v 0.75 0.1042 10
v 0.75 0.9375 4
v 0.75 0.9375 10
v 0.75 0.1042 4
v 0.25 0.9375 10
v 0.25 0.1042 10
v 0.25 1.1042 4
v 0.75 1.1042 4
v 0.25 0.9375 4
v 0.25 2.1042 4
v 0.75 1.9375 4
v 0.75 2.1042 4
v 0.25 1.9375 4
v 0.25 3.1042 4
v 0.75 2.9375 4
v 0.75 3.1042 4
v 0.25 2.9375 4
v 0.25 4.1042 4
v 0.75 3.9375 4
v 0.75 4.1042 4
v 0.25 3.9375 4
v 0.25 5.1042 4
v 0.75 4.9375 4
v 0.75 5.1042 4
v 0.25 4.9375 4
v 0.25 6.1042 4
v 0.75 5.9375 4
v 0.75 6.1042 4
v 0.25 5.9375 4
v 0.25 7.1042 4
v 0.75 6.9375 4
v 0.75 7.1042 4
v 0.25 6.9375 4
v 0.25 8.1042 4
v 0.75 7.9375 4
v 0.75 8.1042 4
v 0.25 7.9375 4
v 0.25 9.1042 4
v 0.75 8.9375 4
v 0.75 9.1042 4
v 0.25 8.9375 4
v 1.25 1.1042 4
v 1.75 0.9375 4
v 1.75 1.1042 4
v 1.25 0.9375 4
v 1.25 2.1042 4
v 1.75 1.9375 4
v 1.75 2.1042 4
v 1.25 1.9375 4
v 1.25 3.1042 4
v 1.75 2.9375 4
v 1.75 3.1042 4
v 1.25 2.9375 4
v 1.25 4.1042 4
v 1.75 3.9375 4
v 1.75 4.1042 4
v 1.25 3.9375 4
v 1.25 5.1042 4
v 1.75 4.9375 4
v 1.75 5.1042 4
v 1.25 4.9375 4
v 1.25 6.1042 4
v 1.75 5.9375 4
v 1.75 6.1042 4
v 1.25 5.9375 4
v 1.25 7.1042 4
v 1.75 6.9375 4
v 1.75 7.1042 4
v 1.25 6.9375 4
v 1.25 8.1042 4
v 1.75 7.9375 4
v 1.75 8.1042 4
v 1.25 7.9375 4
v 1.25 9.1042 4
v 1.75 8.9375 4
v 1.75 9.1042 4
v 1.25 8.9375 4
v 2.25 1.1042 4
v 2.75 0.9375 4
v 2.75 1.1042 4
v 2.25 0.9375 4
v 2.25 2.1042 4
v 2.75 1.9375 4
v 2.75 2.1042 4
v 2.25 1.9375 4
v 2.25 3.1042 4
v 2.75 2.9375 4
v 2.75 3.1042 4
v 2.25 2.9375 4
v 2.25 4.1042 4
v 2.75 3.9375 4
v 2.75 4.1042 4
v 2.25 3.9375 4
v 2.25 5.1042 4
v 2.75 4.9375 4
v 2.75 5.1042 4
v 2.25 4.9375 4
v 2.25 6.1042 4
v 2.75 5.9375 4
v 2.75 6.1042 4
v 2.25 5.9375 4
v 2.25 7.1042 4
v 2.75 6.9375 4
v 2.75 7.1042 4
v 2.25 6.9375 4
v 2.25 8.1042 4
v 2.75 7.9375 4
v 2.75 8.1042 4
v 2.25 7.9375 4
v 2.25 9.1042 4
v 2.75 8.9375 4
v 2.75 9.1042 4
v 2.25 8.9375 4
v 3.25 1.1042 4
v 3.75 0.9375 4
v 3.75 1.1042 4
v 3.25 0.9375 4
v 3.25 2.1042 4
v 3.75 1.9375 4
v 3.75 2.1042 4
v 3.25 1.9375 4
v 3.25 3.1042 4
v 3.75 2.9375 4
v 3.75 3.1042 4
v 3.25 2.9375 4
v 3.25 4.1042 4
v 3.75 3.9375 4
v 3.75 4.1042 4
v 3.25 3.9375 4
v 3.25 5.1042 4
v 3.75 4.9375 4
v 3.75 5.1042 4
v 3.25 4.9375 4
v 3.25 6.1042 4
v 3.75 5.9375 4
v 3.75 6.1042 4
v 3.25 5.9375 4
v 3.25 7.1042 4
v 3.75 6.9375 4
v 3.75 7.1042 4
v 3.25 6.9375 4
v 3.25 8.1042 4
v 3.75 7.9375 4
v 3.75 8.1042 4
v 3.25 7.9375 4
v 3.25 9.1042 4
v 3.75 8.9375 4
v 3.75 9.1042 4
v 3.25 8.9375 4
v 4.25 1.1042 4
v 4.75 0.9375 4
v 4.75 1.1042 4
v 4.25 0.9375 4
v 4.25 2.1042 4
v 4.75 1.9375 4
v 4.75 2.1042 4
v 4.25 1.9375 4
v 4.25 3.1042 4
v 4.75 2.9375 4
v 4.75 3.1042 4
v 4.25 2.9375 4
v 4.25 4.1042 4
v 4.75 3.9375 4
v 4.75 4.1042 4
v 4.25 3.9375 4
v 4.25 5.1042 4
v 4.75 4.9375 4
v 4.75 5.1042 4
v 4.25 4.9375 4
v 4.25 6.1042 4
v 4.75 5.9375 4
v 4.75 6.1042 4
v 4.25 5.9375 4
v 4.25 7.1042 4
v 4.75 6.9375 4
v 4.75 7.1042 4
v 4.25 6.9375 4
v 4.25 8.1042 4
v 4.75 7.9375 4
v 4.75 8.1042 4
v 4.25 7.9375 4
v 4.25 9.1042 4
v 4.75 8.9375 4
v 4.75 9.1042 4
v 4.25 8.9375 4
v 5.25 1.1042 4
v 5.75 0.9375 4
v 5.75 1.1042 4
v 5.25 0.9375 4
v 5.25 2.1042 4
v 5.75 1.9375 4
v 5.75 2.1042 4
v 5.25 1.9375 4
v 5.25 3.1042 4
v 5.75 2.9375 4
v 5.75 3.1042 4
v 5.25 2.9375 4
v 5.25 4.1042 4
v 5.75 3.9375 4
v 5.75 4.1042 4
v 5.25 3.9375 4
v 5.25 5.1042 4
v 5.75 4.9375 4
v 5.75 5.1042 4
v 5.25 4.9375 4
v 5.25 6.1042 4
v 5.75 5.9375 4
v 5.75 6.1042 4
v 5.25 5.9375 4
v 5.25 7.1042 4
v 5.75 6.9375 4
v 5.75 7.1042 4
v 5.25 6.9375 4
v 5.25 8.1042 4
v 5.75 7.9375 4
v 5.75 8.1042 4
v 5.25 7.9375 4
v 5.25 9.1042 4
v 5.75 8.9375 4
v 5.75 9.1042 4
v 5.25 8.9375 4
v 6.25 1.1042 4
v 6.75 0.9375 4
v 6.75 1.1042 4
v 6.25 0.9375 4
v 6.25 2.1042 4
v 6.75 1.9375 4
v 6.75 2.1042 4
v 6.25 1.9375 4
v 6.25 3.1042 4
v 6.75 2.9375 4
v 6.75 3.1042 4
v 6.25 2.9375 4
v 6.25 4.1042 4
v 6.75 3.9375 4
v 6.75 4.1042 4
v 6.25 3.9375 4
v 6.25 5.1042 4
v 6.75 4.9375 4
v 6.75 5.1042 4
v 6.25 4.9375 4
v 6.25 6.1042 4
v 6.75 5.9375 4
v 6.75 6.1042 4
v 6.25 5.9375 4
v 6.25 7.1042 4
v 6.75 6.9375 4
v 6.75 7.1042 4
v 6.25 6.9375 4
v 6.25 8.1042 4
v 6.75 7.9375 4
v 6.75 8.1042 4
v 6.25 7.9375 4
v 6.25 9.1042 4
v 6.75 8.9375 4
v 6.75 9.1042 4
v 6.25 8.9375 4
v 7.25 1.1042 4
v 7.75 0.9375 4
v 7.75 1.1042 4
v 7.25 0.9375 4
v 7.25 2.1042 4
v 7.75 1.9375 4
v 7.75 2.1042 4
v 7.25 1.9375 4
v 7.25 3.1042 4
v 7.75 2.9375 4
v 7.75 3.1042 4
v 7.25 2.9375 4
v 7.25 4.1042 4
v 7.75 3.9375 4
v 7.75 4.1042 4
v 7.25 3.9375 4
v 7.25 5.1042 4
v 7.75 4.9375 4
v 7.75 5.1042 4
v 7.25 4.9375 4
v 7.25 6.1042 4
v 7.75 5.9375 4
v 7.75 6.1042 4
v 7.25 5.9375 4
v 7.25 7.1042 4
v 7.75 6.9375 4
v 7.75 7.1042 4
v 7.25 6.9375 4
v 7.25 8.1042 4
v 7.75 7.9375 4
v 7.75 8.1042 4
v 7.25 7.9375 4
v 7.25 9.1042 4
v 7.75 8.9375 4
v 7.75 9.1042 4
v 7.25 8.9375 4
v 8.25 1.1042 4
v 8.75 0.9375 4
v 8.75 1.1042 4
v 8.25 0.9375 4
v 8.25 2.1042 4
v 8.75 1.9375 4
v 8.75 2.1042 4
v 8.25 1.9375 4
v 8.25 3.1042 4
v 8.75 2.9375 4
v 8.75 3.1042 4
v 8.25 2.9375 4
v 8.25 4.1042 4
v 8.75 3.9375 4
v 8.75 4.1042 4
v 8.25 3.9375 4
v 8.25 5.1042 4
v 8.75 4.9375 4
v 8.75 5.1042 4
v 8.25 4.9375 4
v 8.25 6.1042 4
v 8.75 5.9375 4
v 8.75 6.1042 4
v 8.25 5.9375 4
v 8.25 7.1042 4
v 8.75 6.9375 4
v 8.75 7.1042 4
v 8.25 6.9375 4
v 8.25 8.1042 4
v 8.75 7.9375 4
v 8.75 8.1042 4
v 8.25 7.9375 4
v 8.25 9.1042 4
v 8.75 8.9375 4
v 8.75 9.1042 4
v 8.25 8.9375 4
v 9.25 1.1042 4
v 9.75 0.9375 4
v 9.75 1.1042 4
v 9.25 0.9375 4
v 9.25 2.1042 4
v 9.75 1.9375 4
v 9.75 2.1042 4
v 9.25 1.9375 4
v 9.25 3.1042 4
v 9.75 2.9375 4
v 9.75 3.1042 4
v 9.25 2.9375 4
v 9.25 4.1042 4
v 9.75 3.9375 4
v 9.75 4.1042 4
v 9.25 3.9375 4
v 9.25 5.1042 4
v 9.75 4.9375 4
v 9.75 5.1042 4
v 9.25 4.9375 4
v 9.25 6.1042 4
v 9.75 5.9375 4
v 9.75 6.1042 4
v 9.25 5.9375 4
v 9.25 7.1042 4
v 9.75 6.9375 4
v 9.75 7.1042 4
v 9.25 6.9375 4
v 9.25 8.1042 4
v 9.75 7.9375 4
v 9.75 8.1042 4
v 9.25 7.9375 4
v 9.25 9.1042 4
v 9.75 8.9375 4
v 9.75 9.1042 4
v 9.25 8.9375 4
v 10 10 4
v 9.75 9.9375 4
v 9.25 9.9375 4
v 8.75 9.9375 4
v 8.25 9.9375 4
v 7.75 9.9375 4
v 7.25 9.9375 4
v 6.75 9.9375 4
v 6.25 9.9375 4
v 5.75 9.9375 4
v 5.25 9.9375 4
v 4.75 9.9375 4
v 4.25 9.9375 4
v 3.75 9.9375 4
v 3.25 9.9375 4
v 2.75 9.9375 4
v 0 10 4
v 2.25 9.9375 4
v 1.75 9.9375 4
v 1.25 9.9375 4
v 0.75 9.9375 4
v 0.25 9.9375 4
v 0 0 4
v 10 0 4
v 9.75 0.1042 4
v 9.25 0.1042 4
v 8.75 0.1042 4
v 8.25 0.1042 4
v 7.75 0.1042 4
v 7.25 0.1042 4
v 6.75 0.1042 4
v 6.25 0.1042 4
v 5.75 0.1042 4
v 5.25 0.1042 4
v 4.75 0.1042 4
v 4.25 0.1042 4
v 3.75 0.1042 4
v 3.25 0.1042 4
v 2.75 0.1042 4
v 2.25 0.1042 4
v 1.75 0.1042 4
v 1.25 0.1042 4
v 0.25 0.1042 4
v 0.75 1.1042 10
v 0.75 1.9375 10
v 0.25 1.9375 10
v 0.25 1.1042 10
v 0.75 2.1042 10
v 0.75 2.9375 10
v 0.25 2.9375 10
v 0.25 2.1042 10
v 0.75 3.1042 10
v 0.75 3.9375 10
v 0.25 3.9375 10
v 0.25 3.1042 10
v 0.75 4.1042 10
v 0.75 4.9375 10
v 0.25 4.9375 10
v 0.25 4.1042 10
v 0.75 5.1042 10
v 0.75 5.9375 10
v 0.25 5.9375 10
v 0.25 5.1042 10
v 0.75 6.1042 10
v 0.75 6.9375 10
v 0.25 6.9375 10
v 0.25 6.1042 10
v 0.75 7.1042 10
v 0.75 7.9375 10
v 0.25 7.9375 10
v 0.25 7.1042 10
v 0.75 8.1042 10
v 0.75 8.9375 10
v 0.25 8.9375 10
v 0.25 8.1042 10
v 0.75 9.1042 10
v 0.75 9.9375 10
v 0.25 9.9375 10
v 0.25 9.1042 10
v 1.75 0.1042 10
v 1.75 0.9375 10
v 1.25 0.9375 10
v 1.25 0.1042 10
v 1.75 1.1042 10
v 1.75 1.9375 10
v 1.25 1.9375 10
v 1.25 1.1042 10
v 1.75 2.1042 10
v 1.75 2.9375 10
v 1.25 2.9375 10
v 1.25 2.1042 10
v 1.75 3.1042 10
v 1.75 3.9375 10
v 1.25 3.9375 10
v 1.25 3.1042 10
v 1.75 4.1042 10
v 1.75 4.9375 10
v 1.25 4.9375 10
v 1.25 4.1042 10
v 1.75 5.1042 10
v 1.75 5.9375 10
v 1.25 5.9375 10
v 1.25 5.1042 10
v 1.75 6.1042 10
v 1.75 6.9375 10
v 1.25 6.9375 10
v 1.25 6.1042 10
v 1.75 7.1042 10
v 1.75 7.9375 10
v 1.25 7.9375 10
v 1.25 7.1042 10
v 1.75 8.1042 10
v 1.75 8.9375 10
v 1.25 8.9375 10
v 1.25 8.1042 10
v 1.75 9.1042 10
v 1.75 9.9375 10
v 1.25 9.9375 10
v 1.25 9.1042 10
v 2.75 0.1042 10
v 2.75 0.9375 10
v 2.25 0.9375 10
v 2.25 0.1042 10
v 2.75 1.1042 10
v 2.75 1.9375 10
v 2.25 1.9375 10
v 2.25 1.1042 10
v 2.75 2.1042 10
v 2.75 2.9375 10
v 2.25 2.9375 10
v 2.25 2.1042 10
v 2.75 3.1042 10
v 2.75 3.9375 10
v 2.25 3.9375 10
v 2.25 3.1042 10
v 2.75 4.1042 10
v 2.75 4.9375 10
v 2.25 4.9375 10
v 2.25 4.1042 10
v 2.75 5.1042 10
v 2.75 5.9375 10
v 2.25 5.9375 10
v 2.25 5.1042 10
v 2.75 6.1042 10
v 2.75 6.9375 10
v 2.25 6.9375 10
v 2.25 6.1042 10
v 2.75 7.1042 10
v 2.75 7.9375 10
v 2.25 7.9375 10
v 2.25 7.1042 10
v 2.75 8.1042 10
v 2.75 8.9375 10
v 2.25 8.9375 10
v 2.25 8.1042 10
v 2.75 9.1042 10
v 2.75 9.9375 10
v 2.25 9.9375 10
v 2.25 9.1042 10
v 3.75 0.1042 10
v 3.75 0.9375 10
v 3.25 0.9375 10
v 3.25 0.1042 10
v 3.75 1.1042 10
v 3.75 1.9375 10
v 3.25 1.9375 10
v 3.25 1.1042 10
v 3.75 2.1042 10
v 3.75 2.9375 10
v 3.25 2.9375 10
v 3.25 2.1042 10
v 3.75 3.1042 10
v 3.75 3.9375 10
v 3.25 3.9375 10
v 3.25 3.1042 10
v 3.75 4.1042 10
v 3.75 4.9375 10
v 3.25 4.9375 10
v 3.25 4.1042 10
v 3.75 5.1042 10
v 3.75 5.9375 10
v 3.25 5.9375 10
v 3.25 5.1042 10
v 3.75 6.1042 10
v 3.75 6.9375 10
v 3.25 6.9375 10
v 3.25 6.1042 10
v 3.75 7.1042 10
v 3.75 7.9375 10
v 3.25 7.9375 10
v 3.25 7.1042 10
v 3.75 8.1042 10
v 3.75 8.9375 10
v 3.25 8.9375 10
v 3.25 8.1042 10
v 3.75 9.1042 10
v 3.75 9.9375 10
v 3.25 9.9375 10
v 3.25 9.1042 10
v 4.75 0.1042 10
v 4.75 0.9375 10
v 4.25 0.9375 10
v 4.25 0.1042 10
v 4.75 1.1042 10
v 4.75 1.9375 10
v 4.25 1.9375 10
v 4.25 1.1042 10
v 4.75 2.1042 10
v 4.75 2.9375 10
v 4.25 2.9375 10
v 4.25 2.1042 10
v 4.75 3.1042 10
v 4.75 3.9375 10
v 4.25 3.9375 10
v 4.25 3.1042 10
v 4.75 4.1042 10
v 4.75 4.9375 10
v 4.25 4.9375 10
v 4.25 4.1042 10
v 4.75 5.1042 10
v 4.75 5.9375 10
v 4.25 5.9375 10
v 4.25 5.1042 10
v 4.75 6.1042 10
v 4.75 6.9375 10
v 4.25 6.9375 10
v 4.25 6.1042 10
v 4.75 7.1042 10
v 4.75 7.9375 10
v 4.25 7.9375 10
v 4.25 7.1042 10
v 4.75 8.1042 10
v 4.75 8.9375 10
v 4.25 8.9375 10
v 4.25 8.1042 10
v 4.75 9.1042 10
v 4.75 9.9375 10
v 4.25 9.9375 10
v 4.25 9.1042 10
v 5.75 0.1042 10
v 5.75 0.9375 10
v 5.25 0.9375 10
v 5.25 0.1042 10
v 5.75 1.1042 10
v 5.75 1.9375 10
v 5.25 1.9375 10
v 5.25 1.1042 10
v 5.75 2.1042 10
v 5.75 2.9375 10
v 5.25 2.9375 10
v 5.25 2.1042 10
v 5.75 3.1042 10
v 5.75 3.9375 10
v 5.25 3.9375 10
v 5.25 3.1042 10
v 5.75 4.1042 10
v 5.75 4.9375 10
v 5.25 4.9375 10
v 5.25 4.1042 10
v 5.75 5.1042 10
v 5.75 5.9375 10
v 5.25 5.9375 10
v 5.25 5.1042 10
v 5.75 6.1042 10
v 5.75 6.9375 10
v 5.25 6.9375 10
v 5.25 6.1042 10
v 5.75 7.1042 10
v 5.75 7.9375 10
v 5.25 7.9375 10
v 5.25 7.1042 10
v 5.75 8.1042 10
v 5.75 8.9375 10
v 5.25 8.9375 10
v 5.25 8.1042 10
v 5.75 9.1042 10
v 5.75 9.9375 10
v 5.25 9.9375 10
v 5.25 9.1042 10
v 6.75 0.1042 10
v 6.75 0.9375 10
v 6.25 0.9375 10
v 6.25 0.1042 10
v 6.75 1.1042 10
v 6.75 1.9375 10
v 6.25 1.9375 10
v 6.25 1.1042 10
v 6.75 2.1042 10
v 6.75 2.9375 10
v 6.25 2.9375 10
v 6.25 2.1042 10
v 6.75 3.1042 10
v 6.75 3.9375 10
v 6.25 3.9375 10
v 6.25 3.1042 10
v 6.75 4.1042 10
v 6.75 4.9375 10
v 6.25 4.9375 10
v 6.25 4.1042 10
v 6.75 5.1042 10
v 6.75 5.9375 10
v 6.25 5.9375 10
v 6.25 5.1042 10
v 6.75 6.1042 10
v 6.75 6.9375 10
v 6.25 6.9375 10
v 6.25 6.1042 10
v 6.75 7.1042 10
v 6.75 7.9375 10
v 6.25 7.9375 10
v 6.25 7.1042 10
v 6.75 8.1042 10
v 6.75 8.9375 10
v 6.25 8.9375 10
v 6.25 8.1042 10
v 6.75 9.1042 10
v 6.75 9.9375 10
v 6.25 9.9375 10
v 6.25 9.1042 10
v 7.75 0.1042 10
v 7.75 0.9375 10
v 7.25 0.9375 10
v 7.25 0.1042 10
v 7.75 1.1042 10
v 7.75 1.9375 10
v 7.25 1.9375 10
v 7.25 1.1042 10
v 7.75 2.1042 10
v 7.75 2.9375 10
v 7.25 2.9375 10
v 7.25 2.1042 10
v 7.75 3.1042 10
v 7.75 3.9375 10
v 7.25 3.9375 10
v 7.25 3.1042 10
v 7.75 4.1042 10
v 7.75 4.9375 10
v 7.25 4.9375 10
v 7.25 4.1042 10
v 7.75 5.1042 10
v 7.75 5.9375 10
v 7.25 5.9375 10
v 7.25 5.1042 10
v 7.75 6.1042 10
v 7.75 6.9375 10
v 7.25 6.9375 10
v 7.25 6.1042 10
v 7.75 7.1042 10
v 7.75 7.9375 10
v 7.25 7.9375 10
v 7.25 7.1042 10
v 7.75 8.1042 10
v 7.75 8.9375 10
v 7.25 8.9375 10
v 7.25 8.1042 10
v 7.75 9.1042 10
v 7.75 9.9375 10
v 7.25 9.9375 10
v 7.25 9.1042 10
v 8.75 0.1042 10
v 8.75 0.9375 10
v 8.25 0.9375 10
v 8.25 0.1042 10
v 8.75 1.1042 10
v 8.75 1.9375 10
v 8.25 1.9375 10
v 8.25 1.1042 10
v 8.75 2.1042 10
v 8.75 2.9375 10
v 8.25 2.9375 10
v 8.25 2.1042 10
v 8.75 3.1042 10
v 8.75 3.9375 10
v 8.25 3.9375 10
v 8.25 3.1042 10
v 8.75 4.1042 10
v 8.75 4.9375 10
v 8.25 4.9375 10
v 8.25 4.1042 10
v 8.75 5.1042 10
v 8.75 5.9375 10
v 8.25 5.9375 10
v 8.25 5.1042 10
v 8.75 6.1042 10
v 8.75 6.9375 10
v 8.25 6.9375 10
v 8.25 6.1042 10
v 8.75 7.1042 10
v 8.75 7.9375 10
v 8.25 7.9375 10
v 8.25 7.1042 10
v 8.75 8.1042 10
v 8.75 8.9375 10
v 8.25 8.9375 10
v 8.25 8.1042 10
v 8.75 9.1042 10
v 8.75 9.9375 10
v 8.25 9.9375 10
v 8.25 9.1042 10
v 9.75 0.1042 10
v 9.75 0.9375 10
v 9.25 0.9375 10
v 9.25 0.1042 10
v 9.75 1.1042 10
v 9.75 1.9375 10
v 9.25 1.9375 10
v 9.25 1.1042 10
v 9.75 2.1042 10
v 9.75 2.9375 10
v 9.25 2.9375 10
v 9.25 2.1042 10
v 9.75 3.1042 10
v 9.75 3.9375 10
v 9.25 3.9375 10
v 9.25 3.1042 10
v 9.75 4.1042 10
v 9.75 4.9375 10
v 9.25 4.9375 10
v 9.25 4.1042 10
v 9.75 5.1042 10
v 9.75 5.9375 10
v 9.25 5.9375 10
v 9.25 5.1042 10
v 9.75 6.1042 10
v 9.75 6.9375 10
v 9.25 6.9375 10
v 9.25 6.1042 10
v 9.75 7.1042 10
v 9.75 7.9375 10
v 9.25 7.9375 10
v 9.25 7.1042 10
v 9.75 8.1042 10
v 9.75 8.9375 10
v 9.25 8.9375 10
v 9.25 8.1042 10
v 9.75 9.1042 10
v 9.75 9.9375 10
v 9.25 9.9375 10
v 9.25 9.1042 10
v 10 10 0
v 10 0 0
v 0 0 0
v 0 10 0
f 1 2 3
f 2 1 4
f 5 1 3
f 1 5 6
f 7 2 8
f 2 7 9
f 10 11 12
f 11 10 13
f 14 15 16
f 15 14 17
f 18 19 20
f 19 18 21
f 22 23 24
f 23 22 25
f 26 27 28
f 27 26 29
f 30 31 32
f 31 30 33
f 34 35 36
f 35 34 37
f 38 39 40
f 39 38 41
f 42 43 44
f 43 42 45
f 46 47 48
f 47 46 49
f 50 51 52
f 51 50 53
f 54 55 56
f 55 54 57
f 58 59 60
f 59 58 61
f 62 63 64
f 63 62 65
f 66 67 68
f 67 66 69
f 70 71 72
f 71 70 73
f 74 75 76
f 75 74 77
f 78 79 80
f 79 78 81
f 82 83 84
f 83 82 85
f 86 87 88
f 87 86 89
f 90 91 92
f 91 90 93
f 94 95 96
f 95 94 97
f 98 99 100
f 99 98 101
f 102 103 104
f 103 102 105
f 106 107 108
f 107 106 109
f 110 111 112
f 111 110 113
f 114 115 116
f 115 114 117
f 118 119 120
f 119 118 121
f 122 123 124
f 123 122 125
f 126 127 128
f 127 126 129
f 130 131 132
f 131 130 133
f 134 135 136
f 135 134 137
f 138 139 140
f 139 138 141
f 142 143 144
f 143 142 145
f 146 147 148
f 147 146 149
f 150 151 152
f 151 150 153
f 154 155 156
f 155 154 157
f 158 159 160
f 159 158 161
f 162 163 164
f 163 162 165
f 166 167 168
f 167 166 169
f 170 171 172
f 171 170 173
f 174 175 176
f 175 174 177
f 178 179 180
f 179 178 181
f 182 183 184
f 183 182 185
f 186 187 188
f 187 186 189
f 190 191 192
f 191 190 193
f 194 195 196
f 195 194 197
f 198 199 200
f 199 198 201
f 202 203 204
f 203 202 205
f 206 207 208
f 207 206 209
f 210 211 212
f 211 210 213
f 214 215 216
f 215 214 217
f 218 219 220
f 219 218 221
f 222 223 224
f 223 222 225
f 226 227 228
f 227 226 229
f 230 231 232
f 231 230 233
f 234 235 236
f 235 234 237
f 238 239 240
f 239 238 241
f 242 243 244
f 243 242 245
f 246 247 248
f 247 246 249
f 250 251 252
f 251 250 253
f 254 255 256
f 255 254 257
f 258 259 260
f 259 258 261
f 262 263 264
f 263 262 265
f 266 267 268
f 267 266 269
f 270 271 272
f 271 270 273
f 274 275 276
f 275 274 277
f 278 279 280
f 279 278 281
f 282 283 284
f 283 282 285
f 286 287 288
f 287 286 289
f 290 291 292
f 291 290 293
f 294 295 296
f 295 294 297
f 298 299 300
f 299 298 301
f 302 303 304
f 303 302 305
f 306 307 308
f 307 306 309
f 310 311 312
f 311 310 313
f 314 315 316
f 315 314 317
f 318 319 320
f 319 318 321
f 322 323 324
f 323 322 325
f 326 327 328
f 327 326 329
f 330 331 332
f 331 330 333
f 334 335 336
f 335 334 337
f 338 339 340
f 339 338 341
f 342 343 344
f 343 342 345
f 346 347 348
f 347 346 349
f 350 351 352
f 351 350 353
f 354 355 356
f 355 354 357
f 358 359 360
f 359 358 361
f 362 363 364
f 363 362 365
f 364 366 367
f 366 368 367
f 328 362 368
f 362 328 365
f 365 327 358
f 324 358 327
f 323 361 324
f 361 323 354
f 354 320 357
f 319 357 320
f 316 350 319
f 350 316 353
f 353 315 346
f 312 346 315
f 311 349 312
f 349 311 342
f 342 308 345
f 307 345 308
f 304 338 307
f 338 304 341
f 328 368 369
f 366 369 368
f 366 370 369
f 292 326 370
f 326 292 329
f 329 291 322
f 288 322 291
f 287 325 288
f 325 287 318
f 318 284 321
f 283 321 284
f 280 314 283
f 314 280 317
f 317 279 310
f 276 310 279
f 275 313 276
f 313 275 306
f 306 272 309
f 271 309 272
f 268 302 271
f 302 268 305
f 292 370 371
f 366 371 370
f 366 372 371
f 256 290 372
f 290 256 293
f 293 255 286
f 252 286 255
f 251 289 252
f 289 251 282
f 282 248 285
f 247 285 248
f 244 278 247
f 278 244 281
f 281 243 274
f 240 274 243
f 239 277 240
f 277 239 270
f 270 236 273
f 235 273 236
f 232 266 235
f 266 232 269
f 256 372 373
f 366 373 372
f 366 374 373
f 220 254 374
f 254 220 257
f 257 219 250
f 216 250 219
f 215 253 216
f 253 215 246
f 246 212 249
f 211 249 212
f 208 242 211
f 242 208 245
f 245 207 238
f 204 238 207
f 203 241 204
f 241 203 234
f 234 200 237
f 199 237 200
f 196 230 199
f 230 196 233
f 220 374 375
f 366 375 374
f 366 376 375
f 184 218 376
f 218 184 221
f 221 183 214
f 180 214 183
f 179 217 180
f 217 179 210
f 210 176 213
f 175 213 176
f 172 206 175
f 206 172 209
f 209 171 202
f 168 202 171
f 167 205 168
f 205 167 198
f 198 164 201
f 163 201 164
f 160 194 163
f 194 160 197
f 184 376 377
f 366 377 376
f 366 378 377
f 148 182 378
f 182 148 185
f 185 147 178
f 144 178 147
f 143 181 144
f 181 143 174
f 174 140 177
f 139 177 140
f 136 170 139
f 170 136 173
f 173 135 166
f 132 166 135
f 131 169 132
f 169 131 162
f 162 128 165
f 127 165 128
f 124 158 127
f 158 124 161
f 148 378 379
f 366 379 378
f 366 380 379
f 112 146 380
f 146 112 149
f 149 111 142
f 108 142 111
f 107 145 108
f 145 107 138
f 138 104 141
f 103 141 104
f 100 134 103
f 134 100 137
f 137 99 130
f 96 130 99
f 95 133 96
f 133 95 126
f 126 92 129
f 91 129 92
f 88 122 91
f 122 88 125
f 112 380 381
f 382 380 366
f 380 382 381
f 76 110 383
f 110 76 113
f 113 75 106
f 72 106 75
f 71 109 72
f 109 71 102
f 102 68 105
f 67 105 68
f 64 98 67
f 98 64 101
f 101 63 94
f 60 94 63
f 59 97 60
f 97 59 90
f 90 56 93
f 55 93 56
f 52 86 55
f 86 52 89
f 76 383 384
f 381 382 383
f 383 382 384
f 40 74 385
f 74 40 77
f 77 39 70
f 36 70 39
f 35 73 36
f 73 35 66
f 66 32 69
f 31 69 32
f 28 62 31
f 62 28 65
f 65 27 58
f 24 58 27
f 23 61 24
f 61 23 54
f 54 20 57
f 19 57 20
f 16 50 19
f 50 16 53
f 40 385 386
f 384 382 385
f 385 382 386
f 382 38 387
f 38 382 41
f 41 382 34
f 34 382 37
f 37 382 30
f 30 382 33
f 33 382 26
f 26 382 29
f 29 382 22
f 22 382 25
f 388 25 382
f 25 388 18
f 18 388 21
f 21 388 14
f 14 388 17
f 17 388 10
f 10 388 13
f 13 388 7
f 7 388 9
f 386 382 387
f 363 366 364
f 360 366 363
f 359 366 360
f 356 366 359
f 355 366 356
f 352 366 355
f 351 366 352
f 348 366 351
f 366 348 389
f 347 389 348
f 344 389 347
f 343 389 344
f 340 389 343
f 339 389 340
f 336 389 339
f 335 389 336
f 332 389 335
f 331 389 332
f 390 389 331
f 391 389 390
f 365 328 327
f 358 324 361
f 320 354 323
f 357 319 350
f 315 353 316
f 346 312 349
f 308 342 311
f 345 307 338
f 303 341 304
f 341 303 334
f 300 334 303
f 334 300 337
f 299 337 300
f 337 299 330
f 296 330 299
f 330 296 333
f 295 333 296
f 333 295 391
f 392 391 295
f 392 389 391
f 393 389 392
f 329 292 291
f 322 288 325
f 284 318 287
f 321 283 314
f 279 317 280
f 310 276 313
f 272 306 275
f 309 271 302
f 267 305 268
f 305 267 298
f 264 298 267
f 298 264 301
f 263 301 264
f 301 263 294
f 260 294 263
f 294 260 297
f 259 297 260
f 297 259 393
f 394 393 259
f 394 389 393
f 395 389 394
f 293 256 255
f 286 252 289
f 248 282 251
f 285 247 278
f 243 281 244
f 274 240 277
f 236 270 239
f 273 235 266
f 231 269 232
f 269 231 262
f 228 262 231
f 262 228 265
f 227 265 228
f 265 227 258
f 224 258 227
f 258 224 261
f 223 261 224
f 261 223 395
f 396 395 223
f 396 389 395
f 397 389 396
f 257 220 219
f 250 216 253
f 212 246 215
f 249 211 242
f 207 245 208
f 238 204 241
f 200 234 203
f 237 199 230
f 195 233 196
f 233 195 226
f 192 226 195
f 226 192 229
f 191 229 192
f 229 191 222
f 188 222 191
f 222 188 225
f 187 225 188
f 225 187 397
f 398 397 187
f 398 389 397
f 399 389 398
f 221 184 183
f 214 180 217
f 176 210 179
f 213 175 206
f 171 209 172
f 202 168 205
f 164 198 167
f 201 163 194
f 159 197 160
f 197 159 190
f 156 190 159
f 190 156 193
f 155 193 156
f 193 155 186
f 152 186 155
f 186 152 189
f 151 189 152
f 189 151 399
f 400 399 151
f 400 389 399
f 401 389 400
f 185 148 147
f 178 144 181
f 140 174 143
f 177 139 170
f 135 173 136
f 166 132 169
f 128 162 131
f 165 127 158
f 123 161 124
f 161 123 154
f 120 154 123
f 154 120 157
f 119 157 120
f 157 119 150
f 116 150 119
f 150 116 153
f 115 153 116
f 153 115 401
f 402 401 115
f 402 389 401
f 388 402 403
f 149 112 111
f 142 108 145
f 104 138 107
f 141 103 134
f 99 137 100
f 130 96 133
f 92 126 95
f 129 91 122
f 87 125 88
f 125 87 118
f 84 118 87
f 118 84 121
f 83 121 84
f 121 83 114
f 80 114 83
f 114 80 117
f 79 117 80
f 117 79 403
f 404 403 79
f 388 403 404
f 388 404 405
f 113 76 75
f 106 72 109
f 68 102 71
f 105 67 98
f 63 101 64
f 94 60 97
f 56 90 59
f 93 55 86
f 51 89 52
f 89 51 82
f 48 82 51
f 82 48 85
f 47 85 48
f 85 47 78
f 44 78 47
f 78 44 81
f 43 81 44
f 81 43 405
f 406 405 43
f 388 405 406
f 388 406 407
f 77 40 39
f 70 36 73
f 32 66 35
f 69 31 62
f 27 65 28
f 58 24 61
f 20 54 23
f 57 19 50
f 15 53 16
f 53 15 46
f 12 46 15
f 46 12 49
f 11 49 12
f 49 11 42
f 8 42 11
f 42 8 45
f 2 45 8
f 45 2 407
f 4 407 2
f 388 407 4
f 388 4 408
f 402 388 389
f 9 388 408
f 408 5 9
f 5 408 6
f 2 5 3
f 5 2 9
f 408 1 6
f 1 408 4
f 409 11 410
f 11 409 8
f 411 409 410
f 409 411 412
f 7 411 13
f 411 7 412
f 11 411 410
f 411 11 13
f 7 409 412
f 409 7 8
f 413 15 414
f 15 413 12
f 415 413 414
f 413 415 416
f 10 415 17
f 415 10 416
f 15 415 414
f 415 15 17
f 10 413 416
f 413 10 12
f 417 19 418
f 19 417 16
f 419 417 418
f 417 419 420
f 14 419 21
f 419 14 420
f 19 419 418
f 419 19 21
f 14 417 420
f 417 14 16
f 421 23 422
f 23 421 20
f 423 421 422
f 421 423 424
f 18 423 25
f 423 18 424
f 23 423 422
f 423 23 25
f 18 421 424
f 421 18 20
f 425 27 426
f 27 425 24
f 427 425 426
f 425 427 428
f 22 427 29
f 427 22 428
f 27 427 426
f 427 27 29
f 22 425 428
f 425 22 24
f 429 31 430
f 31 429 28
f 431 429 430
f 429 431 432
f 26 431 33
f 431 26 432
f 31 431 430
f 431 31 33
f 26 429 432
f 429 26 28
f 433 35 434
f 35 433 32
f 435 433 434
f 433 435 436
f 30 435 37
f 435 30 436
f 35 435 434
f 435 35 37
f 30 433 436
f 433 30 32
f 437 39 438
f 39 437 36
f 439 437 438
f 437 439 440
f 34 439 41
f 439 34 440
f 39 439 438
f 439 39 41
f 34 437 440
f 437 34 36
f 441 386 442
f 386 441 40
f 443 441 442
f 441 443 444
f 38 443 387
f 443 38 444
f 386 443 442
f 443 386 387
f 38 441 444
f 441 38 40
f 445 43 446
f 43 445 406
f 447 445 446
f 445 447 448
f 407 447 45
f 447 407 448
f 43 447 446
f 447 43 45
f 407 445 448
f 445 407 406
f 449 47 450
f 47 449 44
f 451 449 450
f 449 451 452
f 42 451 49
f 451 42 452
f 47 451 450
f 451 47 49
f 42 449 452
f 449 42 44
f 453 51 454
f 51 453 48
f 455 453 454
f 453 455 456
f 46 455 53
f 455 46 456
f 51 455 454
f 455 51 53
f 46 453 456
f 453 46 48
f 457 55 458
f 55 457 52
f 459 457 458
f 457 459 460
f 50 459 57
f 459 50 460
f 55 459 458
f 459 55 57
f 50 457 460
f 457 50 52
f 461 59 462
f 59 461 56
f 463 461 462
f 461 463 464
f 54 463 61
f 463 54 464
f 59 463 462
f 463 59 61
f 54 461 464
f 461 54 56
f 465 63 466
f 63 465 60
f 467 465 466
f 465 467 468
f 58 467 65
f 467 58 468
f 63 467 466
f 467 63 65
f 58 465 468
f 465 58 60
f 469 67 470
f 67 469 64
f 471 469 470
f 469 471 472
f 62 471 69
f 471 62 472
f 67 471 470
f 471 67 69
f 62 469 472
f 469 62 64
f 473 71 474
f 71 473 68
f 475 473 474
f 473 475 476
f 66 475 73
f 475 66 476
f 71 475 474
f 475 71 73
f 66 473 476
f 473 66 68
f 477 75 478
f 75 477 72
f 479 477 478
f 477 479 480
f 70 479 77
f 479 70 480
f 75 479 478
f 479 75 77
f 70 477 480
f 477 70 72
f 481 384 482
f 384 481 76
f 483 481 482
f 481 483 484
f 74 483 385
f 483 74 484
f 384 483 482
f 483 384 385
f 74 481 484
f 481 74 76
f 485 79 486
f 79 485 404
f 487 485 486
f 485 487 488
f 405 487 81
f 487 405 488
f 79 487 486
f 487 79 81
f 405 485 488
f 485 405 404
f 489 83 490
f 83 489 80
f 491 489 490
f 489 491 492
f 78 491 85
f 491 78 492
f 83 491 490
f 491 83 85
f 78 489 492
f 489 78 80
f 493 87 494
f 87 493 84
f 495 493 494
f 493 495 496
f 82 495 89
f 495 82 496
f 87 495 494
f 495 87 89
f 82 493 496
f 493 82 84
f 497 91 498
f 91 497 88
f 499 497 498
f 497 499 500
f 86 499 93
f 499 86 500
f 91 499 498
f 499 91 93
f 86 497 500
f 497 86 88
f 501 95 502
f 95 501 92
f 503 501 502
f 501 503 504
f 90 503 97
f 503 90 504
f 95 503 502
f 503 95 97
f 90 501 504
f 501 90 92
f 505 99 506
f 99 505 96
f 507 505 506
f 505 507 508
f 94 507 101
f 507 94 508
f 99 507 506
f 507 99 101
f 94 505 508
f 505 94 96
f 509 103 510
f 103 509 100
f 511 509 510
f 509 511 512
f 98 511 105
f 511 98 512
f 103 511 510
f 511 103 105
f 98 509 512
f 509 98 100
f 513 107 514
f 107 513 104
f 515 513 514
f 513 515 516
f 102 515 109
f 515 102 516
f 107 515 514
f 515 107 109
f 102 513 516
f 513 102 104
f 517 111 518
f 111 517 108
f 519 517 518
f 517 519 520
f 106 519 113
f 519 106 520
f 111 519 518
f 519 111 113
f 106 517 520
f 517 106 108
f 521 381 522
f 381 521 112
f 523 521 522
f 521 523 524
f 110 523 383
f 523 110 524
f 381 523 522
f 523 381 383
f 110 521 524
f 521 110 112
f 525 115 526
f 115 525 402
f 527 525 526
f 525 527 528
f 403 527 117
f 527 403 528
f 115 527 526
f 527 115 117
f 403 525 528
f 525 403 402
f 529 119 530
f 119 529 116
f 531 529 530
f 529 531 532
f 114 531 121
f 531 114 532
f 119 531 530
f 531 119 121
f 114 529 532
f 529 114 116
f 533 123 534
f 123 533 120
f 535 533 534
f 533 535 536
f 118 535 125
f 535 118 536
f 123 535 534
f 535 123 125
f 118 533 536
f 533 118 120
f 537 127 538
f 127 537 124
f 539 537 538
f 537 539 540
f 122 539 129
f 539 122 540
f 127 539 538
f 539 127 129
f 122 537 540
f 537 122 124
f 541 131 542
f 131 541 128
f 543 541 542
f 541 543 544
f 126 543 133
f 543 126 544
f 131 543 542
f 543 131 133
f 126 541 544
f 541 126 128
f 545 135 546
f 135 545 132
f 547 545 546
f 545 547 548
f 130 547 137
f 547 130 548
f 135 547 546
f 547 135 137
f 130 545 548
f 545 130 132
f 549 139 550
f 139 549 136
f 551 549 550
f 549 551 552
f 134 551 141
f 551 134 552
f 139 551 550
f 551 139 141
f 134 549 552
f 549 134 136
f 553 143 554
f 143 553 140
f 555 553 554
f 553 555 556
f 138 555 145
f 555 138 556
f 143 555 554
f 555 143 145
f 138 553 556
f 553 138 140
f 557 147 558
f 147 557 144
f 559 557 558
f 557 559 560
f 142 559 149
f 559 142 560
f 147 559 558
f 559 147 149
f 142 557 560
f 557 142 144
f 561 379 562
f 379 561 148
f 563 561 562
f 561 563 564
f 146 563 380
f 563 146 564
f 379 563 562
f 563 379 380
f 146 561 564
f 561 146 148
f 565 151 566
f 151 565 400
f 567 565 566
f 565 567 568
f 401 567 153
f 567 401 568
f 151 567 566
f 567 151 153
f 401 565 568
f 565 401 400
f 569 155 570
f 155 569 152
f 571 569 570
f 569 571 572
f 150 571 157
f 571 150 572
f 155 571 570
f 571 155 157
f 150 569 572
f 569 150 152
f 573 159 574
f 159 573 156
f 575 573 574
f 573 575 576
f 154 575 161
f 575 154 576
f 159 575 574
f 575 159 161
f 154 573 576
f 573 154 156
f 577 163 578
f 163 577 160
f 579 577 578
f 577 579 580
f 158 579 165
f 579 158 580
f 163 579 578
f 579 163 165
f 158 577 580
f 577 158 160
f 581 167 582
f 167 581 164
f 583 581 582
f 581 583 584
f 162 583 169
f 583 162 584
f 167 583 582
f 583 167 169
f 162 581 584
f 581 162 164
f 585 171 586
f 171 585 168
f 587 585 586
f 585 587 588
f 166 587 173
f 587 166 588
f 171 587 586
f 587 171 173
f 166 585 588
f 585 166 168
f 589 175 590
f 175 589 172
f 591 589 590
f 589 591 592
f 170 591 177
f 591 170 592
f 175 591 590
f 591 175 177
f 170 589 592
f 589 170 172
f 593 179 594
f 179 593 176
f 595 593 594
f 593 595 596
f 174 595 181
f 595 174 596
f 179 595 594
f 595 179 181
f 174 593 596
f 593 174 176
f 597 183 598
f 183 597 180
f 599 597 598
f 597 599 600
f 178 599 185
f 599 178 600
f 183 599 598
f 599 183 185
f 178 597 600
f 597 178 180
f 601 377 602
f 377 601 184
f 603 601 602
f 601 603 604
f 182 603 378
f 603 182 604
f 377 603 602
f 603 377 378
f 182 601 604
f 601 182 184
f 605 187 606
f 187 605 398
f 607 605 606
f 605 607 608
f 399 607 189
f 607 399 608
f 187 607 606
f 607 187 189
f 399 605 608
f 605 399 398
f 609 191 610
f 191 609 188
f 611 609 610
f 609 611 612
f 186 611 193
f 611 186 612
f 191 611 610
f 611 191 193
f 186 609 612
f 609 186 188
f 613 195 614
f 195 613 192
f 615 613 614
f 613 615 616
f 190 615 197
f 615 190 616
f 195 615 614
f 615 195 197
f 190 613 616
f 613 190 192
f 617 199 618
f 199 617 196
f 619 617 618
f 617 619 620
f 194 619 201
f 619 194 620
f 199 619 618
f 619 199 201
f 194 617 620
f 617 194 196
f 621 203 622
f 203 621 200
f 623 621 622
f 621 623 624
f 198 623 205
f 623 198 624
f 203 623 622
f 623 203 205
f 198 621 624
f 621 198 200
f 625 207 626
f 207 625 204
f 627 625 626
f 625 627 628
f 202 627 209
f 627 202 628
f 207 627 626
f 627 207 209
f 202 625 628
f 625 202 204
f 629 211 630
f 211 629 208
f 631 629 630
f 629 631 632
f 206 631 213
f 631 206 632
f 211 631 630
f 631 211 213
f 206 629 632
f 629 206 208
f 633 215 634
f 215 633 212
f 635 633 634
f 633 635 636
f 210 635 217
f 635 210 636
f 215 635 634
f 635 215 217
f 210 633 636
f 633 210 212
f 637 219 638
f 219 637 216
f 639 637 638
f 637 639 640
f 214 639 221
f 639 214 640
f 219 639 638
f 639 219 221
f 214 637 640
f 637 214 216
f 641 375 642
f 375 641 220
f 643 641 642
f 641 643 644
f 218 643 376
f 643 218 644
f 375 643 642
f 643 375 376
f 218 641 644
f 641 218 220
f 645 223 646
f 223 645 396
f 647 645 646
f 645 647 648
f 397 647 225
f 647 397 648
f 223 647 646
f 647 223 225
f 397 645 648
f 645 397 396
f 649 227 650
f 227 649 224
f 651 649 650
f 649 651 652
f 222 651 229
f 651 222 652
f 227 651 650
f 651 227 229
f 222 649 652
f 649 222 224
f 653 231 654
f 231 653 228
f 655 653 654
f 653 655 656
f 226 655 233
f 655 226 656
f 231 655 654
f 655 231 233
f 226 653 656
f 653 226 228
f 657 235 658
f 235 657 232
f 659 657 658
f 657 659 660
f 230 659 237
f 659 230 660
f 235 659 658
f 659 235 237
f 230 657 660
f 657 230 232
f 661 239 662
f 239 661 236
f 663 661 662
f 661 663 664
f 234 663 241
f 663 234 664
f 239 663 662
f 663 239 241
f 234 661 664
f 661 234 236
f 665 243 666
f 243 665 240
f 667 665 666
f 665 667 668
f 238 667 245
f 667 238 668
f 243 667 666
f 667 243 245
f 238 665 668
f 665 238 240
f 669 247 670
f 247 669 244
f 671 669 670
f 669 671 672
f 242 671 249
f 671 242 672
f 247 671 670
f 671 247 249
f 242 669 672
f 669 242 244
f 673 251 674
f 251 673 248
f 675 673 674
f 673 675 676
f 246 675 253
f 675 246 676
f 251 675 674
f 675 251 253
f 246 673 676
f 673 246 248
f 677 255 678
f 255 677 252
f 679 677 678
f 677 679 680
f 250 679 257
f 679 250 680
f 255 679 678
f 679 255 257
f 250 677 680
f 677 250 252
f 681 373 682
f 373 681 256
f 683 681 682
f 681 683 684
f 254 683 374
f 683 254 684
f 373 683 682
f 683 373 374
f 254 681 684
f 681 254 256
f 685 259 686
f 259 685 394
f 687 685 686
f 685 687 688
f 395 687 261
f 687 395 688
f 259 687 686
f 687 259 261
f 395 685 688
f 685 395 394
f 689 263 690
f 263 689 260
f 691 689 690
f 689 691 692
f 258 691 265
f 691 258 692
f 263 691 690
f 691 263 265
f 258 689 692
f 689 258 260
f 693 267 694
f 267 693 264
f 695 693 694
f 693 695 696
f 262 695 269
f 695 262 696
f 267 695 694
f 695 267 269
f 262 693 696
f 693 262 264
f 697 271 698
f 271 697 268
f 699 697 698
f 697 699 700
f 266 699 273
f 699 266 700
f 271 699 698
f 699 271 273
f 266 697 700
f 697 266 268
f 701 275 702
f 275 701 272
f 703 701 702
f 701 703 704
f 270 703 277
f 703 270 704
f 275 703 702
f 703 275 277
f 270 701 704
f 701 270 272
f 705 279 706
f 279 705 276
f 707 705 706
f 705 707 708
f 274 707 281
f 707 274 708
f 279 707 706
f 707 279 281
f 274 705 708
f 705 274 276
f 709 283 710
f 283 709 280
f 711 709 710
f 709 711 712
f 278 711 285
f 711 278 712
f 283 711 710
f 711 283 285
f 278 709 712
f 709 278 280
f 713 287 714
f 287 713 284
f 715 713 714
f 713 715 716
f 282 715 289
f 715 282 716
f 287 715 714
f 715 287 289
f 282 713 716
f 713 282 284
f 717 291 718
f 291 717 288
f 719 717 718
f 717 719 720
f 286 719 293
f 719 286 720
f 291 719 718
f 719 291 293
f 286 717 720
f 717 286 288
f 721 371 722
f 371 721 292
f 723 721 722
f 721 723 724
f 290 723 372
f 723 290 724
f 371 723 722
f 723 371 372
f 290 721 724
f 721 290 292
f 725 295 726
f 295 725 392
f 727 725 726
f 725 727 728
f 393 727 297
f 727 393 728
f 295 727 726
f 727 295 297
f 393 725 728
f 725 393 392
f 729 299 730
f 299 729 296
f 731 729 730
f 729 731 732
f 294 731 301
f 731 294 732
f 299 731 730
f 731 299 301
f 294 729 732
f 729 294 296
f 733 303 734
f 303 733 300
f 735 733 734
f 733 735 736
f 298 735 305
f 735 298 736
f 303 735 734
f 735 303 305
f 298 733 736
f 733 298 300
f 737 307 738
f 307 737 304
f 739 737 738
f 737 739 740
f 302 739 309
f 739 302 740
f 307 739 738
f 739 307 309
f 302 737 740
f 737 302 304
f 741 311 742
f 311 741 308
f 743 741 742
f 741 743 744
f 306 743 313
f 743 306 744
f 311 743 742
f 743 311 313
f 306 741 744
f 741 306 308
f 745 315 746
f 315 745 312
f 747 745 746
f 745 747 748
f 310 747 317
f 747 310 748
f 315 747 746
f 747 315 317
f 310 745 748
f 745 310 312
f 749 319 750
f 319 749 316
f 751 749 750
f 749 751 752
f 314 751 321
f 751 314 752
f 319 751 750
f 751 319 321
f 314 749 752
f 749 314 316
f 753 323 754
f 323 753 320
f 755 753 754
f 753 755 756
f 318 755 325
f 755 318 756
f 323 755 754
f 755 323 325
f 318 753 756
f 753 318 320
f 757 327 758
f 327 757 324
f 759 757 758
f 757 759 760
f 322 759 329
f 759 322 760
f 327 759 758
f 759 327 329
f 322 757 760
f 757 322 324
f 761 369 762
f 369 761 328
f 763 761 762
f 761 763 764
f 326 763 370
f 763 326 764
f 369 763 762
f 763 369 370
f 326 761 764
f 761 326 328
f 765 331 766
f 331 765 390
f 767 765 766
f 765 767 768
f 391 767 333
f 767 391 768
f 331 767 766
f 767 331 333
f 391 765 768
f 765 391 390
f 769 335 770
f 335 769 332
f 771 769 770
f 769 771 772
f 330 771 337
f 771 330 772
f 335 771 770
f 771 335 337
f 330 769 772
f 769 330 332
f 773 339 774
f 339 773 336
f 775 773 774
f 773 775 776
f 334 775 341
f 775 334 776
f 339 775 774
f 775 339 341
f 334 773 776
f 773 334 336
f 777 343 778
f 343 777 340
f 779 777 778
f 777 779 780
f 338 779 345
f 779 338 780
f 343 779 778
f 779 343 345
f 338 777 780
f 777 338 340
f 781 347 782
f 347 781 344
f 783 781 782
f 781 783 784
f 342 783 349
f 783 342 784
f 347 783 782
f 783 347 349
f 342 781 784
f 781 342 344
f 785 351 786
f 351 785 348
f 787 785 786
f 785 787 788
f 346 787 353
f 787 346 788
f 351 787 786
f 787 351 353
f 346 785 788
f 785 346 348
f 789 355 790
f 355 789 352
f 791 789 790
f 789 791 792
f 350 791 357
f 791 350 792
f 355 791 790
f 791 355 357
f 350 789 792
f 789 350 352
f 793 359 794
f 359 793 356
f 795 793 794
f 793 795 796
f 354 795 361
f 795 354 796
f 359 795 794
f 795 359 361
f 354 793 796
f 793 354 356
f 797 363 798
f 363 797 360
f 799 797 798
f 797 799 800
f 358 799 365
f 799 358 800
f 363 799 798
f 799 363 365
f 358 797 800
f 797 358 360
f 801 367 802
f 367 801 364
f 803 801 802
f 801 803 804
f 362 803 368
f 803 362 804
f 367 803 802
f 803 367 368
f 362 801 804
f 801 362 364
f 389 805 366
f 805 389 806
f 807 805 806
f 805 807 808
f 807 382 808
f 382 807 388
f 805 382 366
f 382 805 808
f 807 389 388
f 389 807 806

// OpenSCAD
/**
 * @author Robotia
 * @brief Modular heatsink, can be printed by selective laser scintering metal
 */
 
heatsink(10, 10, 10, lfc=10, wfc=10);

module heatsink(l, w, h, lfc=10, wfc=10) {
    cube([l, w, h * 0.4]);
    translate([0, 0, h * 0.4]) {
        for(i = [0:lfc-1]) {
            for(j = [0:wfc-1]) {
                translate([ i / lfc * l, j / wfc * w])
                translate([l/lfc/4, w/wfc/9.6, 0]) {
                    cube([l/lfc/2,w/wfc/1.2,h*0.6]);
                }
            }
        }
    }
}
